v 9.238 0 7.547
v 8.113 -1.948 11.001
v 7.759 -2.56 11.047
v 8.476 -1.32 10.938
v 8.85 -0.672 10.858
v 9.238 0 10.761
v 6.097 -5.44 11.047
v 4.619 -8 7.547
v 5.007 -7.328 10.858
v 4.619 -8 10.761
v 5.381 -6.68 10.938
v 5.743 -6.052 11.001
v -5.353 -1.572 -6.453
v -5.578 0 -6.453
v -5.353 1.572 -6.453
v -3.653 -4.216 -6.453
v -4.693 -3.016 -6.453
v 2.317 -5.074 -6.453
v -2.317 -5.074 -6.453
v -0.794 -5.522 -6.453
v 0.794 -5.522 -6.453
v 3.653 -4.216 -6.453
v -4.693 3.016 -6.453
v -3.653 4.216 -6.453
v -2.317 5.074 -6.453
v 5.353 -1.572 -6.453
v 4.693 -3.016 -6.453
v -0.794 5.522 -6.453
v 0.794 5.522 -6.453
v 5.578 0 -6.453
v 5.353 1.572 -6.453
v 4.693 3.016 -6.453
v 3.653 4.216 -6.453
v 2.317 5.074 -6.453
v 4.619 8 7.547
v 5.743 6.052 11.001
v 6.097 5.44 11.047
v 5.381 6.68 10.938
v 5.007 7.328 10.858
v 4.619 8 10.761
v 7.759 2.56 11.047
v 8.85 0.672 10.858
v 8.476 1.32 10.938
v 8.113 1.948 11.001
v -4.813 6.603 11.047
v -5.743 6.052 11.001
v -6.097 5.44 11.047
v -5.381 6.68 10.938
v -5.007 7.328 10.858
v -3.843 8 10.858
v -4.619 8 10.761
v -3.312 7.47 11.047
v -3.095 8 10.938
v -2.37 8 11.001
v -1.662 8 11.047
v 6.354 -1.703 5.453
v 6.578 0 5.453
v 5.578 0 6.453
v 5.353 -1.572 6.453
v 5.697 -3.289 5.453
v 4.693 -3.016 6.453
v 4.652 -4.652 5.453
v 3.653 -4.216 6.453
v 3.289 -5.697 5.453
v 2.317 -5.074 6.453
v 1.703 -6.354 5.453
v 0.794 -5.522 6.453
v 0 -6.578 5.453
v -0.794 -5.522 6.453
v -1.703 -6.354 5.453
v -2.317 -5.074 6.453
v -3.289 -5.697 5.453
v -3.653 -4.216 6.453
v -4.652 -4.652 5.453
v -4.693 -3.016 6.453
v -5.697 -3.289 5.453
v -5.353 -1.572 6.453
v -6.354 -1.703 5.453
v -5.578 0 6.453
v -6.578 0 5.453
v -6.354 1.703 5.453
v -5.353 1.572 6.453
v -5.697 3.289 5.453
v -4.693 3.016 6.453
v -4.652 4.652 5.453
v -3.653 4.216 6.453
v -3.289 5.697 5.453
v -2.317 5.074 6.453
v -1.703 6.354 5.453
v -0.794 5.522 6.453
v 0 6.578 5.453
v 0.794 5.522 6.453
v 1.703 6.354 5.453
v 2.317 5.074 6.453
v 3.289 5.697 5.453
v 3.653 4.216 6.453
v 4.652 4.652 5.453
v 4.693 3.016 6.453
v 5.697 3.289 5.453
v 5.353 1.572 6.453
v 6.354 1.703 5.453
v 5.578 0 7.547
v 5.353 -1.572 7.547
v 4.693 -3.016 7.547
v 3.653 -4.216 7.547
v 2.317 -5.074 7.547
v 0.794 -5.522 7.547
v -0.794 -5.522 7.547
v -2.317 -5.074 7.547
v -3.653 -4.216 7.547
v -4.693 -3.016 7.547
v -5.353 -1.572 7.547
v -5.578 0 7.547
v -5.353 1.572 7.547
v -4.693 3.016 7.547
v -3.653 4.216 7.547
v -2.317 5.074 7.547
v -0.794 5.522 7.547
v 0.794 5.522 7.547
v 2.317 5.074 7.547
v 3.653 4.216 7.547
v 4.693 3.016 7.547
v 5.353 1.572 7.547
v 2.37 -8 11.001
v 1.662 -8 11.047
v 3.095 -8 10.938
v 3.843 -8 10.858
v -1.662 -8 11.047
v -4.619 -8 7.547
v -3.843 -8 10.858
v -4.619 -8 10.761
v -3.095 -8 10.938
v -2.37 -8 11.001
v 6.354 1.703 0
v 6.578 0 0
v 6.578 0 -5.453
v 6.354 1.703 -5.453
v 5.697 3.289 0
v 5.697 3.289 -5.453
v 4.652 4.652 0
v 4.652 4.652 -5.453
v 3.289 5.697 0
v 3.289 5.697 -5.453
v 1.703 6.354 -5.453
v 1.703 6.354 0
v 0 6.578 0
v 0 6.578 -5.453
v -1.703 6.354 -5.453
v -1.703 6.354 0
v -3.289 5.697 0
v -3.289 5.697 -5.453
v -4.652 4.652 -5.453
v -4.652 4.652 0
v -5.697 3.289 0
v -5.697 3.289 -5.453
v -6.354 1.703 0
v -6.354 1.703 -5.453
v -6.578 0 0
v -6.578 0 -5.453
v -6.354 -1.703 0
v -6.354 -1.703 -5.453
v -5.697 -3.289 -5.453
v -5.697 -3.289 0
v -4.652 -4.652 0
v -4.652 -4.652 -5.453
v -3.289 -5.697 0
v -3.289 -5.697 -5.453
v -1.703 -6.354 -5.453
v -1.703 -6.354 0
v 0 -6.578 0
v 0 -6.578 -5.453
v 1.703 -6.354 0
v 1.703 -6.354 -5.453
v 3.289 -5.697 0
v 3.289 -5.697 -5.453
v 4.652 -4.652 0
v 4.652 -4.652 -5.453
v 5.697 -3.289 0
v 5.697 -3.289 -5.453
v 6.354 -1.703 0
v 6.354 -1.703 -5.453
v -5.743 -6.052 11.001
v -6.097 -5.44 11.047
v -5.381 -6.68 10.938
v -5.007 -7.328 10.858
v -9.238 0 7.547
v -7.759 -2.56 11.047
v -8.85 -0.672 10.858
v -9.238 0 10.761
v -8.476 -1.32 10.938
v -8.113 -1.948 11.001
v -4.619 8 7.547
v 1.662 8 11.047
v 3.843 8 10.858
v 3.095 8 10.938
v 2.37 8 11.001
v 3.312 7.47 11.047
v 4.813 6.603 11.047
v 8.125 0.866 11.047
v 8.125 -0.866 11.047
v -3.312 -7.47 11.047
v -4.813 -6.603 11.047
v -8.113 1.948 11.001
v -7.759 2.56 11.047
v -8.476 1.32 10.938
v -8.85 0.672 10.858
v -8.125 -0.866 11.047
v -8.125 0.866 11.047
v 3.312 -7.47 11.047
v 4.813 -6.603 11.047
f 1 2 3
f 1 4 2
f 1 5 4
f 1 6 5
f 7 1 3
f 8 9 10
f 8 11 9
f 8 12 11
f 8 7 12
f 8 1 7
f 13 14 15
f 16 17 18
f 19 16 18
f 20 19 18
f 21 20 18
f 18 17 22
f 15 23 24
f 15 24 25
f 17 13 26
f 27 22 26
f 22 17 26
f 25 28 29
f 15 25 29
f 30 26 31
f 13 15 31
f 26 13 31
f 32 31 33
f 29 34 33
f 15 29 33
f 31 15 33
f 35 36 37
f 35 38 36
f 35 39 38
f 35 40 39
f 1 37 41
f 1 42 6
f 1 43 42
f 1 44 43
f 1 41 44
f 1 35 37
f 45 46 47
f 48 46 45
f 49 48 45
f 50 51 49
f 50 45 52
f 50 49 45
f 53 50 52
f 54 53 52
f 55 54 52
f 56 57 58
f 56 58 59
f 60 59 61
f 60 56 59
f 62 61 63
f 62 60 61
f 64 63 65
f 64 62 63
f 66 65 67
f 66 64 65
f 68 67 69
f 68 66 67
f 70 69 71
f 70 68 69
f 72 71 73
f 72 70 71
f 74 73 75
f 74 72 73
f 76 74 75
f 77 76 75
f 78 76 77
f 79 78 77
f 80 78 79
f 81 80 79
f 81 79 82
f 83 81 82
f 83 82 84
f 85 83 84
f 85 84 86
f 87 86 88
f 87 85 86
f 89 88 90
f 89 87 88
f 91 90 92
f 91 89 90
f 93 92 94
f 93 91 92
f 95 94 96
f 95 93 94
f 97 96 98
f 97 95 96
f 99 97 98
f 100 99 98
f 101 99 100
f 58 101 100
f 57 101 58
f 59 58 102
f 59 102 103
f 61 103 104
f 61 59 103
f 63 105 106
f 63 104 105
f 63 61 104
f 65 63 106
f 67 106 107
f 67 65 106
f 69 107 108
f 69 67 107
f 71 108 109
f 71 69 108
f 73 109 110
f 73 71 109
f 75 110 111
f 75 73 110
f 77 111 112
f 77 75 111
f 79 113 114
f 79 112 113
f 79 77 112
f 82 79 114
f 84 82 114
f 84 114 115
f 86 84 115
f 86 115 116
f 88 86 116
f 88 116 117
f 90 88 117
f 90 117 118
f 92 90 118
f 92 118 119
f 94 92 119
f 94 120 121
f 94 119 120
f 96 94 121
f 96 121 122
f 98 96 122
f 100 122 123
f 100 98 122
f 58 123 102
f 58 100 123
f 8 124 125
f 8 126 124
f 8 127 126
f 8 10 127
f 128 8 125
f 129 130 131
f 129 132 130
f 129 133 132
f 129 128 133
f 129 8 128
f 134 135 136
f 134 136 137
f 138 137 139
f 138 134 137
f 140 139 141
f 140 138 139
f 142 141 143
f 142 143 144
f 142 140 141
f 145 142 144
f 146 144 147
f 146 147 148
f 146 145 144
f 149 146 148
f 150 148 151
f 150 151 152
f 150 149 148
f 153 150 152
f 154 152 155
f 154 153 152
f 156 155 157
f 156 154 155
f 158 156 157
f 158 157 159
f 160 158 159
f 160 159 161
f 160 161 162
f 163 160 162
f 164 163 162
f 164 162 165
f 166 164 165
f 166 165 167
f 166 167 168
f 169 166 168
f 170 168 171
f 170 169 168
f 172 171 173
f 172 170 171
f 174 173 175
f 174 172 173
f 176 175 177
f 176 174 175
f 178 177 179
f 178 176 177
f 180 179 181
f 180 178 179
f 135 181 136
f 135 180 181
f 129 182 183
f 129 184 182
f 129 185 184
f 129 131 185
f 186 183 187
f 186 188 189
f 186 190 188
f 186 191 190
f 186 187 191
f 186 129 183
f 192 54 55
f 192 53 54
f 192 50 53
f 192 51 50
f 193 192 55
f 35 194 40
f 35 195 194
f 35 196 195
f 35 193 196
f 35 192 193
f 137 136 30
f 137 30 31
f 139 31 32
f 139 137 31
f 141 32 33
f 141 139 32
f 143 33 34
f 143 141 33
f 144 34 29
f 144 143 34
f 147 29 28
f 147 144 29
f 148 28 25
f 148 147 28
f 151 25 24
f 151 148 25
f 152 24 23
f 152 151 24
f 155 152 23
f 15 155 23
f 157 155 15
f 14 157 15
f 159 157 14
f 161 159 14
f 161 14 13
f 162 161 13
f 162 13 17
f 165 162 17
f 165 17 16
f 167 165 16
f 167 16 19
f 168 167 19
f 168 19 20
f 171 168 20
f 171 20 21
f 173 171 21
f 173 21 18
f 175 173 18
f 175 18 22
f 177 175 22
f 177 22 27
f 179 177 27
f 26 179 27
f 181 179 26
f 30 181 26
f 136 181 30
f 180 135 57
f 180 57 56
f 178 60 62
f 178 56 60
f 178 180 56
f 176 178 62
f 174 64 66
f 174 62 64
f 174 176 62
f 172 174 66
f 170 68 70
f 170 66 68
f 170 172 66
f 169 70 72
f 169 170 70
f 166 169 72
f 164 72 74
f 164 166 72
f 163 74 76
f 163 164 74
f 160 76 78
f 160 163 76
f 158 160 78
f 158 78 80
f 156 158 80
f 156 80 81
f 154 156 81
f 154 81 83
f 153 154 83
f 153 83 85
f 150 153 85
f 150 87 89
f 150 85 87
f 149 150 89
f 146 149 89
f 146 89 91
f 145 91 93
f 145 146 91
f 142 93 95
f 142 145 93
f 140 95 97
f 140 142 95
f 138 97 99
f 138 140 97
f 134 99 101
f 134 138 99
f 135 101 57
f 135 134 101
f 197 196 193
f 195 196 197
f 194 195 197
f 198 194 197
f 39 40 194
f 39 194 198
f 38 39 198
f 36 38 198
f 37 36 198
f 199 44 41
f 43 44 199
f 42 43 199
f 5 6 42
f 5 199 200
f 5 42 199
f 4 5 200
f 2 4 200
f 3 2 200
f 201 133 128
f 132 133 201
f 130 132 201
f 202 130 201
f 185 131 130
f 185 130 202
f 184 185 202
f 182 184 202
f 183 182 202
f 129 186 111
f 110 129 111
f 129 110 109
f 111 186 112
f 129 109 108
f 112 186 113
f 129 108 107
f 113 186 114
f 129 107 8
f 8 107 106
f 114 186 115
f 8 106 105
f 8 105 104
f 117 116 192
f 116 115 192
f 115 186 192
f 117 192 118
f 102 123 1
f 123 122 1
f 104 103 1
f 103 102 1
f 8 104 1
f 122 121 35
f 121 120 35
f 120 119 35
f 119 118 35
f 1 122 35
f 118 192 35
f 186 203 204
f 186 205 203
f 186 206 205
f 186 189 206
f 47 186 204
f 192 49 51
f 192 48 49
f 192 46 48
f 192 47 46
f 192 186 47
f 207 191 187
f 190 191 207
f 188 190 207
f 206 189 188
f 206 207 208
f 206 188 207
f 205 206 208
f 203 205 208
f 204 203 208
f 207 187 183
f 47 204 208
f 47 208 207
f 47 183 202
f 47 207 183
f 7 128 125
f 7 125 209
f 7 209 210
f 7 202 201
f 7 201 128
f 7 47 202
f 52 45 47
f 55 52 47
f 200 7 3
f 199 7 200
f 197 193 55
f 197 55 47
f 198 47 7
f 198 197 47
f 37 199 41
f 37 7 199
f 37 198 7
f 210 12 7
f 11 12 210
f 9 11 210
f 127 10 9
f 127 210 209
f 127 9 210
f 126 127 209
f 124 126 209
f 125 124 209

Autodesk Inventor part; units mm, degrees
ref_plane "YZ Plane" through (0, 0, 0) normal (1, 0, 0) x (0, 1, 0)
ref_plane "XZ Plane" through (0, 0, 0) normal (0, 1, 0) x (-1, 0, 0)
ref_plane "XY Plane" through (0, 0, 0) normal (0, 0, 1) x (1, 0, 0)
sketch "Szkic7" plane through (0, 0, 0) normal (0, 0, 1) x (1, 0, 0)
  circle A0 centre (0, 0) radius 6.5785
  dimension "d35" = 13.157
extrude "Wyciągnięcie proste2" add sketch "Szkic7" along normal mid plane 12.9062
chamfer "Faza2" distance 1 angle 45 1 edges at (-6.5785, 0, 6.4531)
sketch "Szkic9" plane through (0, 0, 6.4531) normal (0, 0, 1) x (1, 0, 0)
  circle A0 centre (0, 0) radius 5.5785 projected
extrude "Wyciągnięcie proste3" add sketch "Szkic9" along normal blind 1.0938
sketch "Szkic10" plane through (0, 0, 7.5469) normal (0, 0, 1) x (1, 0, 0)
  line L0 (-4.6188, 8) -> (4.6188, 8)
  line L1 (4.6188, 8) -> (9.2376, 0)
  line L2 (9.2376, 0) -> (4.6188, -8)
  line L3 (4.6188, -8) -> (-4.6188, -8)
  line L4 (-4.6188, -8) -> (-9.2376, 0)
  line L5 (-9.2376, 0) -> (-4.6188, 8)
  line L6 (0, 9.2099) -> (0, -9.2099) construction
  line L7 (-9.6995, 0) -> (9.6995, 0) construction
  point P0 (0, 0)
  point P1 (0, 0)
  point P2 (0, 8)
  dimension "d44" = 16
extrude "Wyciągnięcie proste4" add sketch "Szkic10" along normal blind 3.5
sketch "Szkic12" plane through (0, 0, 0) normal (0, 1, 0) x (-1, 0, 0)
  line L0 (0, -2.1463) -> (0, 12.8775) construction
  line L1 (-4.6188, 7.5469) -> (-4.6188, 11.0469) construction
  line L2 (-9.2376, 11.0469) -> (-4.6188, 11.0469) construction
  line L3 (-9.2376, 7.5469) -> (-9.2376, 11.0469) projected
  line L4 (-9.2376, 10.7611) -> (-8.1709, 11.0469)
  line L5 (-9.2376, 11.0469) -> (-4.6188, 11.0469) projected
  line L6 (-9.2376, 7.5469) -> (-4.6188, 7.5469) projected
  point P0 (0, 0)
  dimension "d50" = 15
  dimension "d51" = 1.0667
revolve "Obrót2" cut sketch "Szkic12" angle 360 about axis through (0, 0, -10) along (0, 0, 1)
thread "Gwint3" size "G13.157x1.337" designation "G 1/4" class "A" standard "ISO Pipe Threads" full length
chamfer "Faza3" distance 1 angle 45 1 edges at (-6.5785, 0, -6.4531)
equation "\"d35\" = OD"
equation "\"d36\" = 0.7375 * L"
equation "\"d42\" = 0.0625 * L"
equation "\"d44\" = SW"
equation "\"d45\" = 0.2 * L"
equation "\"d51\" = 0.0666667 * SW"
equation "\"SzerokośćGięciaPodcięcia\" = Grubość"
equation "\"RozmiarPodcięciaNarożnika\" = 4 * Grubość"
equation "\"PromieńPrzejścia\" = PromieńGięcia"
equation "\"Rozmiar_promienia_Jacobiego\" = PromieńGięcia"
equation "\"Wielk_odstępu\" = Grubość"
equation "\"d2\" = PromieńGięcia"
equation "\"d23\" = PromieńGięcia"
equation "\"OD\" = 13.157"
equation "\"SW\" = 16"
equation "\"L\" = 17.5"
equation "\"Grubość\" = 1.5"
equation "\"PromieńGięcia\" = 3"
properties part number "Korek sześciokątny BSP 1/4'' L=17,5" material "304"
